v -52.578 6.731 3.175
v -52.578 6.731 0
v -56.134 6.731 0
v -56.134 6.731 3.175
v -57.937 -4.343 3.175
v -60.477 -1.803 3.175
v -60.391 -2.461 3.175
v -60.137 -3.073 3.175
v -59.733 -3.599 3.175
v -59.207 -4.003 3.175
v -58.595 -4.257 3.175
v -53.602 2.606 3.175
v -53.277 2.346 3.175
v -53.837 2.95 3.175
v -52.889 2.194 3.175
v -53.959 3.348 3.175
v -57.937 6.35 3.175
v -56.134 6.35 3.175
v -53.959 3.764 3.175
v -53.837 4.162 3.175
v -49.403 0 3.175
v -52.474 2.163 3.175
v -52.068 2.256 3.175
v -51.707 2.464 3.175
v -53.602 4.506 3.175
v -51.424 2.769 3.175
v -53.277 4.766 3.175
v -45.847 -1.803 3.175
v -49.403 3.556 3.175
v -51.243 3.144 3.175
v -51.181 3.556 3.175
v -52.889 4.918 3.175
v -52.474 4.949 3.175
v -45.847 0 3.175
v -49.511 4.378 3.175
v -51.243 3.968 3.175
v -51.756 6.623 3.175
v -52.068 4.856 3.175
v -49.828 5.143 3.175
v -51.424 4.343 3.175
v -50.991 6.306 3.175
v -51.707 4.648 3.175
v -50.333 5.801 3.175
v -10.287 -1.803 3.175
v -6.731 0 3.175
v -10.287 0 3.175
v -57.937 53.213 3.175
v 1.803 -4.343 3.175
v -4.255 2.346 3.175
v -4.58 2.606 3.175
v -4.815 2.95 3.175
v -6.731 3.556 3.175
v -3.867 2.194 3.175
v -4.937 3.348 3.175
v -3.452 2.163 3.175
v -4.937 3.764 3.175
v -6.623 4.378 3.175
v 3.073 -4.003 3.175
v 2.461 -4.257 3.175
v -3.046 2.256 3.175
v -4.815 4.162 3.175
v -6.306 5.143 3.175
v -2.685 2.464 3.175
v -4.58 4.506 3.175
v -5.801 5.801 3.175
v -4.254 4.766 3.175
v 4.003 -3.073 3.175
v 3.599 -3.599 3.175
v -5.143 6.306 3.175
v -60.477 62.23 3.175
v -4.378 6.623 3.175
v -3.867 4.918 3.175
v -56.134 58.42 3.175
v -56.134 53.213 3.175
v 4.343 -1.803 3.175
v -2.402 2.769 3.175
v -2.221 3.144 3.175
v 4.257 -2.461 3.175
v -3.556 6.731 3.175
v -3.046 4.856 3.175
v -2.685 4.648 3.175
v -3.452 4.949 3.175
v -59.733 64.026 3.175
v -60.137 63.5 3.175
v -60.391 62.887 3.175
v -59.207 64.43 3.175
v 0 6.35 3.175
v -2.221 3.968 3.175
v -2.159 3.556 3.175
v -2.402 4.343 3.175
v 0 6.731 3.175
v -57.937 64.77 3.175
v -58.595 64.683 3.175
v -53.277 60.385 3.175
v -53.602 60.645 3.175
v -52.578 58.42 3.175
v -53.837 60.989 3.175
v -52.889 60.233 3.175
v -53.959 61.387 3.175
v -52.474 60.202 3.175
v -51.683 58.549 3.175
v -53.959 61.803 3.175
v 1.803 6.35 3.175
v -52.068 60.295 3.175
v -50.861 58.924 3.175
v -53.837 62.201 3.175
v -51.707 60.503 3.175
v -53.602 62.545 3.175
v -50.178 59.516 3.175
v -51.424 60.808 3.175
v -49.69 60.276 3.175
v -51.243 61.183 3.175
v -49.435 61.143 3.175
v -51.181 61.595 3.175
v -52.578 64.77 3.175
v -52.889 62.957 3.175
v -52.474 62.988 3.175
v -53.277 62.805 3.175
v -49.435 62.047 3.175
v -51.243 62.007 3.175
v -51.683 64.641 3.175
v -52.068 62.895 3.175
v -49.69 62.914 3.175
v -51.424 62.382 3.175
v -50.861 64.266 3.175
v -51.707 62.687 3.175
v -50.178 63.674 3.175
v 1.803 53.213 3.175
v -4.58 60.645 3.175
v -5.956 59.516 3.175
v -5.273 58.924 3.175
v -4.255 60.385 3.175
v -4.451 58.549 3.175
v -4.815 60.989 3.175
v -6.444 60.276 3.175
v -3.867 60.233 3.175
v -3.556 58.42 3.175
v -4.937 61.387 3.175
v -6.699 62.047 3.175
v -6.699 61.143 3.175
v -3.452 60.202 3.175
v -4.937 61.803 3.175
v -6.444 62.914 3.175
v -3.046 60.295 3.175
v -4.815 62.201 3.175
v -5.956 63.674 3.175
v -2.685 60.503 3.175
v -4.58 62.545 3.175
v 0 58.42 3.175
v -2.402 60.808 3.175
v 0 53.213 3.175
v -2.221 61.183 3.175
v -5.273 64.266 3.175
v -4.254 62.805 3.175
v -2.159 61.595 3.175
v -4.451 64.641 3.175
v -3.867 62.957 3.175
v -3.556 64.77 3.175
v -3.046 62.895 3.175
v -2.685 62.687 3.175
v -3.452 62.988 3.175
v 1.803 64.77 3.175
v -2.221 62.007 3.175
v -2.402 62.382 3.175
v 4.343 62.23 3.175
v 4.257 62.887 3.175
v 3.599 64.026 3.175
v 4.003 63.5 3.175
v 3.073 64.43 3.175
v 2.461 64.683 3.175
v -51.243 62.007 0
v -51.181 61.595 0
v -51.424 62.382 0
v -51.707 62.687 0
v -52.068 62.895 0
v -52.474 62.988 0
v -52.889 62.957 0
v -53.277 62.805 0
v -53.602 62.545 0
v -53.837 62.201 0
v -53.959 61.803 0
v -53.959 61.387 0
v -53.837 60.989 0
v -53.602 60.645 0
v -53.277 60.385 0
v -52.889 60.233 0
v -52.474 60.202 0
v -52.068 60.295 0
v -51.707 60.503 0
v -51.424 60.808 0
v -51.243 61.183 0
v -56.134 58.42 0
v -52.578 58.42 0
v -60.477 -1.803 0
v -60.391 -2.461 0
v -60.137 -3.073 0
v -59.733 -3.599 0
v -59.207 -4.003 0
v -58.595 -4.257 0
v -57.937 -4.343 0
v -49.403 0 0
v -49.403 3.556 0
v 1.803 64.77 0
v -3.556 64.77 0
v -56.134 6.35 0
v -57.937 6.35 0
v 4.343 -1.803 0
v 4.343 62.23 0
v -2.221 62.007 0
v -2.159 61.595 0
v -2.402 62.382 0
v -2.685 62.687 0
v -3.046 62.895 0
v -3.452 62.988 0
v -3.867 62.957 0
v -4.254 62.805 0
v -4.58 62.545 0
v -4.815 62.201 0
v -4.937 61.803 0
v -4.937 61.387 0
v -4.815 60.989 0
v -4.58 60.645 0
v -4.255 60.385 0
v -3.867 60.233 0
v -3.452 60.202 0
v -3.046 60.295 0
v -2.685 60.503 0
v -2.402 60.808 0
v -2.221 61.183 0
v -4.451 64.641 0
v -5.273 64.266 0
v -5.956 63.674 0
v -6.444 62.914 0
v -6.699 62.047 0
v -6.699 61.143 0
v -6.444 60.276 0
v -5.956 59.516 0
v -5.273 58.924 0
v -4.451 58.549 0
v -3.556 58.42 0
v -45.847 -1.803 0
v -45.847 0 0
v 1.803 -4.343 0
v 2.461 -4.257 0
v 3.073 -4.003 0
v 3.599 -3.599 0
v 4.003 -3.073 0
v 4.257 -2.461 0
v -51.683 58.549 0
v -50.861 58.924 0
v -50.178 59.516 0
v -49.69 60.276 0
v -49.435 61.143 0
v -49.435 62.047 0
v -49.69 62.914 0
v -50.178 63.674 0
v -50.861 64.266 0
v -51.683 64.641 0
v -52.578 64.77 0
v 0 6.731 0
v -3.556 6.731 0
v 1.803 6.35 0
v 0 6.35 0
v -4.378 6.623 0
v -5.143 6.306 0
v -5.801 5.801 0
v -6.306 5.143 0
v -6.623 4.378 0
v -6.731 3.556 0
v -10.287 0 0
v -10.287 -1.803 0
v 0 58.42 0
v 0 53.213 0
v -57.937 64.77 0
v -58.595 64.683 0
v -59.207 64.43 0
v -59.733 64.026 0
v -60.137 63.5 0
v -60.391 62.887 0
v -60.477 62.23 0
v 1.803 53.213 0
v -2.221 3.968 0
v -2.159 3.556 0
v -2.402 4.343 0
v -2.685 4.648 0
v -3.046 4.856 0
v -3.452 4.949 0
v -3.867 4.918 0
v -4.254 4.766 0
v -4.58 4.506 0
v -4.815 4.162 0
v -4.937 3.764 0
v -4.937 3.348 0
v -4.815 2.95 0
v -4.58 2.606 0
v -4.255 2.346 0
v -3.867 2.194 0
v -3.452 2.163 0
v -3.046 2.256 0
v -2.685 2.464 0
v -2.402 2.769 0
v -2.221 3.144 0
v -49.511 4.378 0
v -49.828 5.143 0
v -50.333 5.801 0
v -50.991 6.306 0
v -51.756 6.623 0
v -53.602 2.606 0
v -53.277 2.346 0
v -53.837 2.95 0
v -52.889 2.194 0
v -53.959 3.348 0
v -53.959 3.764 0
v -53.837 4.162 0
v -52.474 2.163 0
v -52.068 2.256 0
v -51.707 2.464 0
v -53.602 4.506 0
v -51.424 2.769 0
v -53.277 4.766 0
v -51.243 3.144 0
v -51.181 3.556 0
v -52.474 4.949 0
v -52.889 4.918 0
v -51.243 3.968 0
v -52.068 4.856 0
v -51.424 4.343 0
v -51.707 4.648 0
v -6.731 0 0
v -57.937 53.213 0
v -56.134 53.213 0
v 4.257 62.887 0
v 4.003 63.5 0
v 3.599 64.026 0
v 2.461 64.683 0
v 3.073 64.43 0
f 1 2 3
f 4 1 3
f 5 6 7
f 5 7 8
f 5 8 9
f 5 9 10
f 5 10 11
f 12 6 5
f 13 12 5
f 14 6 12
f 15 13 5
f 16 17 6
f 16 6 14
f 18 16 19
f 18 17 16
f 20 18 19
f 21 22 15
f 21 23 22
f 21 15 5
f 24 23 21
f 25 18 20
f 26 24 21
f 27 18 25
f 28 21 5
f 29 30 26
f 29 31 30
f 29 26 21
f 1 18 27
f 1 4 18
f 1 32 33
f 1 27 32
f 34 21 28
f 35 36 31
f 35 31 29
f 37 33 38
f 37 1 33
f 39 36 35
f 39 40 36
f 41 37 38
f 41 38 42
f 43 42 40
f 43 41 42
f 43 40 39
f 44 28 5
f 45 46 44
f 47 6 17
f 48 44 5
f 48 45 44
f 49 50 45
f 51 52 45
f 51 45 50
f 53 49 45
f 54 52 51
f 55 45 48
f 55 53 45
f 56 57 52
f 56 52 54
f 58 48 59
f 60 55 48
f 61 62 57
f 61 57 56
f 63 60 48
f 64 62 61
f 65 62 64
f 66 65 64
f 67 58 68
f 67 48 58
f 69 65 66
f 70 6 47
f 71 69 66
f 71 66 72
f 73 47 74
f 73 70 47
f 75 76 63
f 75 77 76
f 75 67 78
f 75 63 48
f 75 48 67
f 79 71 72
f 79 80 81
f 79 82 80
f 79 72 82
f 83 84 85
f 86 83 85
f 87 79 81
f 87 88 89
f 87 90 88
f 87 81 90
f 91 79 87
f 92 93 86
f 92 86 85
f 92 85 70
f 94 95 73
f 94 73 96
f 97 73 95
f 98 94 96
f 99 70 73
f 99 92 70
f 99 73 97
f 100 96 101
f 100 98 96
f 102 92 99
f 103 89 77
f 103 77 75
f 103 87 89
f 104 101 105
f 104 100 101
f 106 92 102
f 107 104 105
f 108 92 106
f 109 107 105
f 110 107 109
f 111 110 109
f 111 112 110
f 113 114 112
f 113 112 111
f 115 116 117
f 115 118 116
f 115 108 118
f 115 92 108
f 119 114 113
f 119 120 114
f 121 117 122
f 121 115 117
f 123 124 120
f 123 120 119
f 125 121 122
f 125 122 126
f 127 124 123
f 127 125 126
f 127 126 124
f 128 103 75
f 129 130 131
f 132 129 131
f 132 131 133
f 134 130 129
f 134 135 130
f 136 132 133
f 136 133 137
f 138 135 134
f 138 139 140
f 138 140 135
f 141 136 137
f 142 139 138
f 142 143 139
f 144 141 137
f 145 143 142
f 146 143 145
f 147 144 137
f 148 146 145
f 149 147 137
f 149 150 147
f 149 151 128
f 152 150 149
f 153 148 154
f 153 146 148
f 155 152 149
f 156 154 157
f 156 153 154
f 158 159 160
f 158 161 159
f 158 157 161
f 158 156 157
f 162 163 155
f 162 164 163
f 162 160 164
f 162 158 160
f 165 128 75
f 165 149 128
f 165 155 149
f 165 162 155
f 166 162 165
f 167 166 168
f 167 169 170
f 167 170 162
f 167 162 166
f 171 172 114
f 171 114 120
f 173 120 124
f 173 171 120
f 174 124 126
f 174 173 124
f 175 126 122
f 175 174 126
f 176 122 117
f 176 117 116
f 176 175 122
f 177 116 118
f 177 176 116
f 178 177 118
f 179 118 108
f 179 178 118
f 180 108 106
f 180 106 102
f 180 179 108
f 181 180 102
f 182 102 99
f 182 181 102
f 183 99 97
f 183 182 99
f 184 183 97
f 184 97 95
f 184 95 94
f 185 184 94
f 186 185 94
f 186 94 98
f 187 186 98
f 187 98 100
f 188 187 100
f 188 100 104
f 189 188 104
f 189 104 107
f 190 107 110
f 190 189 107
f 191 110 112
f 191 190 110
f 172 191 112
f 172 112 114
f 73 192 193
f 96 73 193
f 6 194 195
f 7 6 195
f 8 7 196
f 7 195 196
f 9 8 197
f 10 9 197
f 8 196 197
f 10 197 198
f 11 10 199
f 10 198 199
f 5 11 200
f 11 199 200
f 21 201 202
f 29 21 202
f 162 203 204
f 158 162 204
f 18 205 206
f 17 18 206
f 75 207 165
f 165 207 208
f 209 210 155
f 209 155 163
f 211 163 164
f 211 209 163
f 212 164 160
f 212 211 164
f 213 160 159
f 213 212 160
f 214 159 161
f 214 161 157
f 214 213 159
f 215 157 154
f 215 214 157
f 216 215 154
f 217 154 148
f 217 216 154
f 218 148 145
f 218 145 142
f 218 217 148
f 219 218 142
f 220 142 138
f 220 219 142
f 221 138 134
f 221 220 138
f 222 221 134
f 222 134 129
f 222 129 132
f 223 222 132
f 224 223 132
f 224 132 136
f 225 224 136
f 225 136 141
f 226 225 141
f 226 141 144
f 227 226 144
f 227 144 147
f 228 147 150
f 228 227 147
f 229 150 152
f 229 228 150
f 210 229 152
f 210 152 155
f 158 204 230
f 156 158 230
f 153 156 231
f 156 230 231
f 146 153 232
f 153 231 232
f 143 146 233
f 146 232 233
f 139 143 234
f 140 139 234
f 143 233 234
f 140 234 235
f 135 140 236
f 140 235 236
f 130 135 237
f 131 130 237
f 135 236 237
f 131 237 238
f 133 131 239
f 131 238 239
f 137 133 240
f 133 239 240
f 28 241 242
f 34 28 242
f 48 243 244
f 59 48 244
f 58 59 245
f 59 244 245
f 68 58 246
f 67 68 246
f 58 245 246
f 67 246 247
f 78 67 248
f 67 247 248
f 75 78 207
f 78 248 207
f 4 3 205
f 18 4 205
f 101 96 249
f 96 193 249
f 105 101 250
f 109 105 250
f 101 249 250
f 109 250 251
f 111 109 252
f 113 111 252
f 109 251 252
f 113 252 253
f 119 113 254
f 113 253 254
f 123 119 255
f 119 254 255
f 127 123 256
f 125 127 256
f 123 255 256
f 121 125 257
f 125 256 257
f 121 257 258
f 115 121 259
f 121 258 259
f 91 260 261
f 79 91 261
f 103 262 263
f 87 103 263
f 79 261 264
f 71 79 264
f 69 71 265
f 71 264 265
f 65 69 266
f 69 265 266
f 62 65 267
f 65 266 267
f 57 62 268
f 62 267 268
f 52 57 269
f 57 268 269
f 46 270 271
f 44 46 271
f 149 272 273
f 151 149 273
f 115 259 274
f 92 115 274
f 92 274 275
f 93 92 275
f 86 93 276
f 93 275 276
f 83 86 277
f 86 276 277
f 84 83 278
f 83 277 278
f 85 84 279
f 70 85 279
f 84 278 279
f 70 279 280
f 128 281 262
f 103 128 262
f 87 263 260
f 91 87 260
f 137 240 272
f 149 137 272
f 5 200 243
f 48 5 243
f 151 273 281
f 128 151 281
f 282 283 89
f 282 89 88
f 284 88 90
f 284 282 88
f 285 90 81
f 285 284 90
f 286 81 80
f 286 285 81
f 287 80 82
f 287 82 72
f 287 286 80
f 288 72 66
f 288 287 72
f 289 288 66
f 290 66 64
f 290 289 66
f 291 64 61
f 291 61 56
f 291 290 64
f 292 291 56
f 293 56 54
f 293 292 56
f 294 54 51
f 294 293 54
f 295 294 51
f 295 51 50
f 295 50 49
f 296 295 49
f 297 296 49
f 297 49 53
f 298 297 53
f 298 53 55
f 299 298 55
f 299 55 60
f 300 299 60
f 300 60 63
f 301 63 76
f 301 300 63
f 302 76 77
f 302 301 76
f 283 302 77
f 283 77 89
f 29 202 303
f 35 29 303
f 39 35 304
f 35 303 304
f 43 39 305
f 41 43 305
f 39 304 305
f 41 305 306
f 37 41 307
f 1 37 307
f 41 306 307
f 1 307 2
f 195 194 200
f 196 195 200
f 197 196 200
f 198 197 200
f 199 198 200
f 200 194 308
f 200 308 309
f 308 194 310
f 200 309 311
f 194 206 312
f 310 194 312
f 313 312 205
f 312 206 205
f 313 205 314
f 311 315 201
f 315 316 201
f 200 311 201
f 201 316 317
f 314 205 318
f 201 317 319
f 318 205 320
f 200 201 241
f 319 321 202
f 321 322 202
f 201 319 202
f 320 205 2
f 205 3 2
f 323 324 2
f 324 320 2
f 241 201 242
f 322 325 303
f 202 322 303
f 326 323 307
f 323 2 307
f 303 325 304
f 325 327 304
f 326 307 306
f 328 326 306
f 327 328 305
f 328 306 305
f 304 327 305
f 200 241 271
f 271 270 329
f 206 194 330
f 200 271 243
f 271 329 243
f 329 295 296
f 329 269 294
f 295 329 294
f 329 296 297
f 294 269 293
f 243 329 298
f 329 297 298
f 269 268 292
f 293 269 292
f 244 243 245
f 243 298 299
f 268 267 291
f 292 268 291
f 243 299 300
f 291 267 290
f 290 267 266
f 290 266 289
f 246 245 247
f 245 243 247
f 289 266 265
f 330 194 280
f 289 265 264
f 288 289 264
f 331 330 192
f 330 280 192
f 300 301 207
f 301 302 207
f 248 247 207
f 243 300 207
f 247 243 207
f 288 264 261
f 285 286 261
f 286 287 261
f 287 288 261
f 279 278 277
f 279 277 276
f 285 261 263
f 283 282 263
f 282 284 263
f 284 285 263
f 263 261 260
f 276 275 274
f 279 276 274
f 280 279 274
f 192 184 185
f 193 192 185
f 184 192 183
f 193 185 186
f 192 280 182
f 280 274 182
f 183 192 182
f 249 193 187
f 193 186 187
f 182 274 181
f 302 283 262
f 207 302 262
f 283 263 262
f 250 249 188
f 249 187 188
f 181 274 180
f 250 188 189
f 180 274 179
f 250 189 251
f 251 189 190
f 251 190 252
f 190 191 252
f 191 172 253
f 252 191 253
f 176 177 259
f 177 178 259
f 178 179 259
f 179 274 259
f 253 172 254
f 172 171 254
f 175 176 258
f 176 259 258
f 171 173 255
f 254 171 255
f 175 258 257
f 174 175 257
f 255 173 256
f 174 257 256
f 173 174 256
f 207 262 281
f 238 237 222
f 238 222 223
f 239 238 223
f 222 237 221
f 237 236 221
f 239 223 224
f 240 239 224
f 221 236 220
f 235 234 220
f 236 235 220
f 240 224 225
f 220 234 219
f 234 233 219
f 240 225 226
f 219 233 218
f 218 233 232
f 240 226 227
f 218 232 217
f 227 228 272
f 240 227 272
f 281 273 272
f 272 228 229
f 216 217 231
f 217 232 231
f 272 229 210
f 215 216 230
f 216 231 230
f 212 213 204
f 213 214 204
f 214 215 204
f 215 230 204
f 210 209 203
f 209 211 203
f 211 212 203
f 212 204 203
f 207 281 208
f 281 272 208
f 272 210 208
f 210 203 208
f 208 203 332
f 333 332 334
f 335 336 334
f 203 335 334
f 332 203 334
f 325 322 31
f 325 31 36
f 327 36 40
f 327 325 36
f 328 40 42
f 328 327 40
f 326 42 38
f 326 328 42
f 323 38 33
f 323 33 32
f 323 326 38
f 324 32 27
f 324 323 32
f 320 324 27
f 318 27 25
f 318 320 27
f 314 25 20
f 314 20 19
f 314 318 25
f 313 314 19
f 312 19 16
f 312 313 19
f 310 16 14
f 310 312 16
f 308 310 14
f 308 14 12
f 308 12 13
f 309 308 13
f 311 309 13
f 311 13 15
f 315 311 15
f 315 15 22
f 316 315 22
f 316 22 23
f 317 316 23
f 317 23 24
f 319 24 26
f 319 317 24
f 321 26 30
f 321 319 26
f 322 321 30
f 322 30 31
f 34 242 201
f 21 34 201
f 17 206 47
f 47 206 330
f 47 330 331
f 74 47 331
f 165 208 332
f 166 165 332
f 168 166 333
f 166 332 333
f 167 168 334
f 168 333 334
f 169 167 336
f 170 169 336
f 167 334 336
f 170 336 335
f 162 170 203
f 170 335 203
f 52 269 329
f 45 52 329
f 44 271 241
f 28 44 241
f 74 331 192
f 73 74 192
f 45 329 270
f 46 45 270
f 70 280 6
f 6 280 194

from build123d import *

# Parameters (mm, degrees)
SKETCH1_R           = 3.175
SKETCH1_R_2         = 1.397
BOSS_EXTRUDE1_DEPTH = 3.175


with BuildPart() as part:
    # Sketch1 → Boss-Extrude1 (new body)
    # profile 1 of 5: a face of its own
    with BuildSketch(Plane.XY):
        with BuildLine():
            Line((0, 58.42), (0, 53.213))
            Line((0, 53.213), (1.8034, 53.213))
            Line((1.8034, 53.213), (1.8034, 6.35))
            Line((1.8034, 6.35), (0, 6.35))
            Line((0, 6.35), (0, 6.731))
            Line((0, 6.731), (-3.556, 6.731))
            ThreePointArc((-3.556, 6.731), (-1.31093597, 5.80106403), (-0.381, 3.556))
            ThreePointArc((-0.381, 3.556), (-3.556, 0.381), (-6.731, 3.556))
            Line((-6.731, 3.556), (-6.731, 0))
            Line((-6.731, 0), (-10.287, 0))
            Line((-10.287, 0), (-10.287, -1.8034))
            Line((-10.287, -1.8034), (-45.847, -1.8034))
            Line((-45.847, -1.8034), (-45.847, 0))
            Line((-45.847, 0), (-49.403, 0))
            Line((-49.403, 0), (-49.403, 3.556))
            ThreePointArc((-49.403, 3.556), (-54.82306403, 1.31093597), (-52.578, 6.731))
            Line((-52.578, 6.731), (-56.134, 6.731))
            Line((-56.134, 6.731), (-56.134, 6.35))
            Line((-56.134, 6.35), (-57.9374, 6.35))
            Line((-57.9374, 6.35), (-57.9374, 53.213))
            Line((-57.9374, 53.213), (-56.134, 53.213))
            Line((-56.134, 53.213), (-56.134, 58.42))
            Line((-56.134, 58.42), (-52.578, 58.42))
            ThreePointArc((-52.578, 58.42), (-55.753, 61.595), (-52.578, 64.77))
            Line((-52.578, 64.77), (-57.9374, 64.77))
            ThreePointArc((-57.9374, 64.77), (-59.733451224, 64.026051224), (-60.4774, 62.23))
            Line((-60.4774, 62.23), (-60.4774, -1.8034))
            ThreePointArc((-60.4774, -1.8034), (-59.733451224, -3.599451224), (-57.9374, -4.3434))
            Line((-57.9374, -4.3434), (1.8034, -4.3434))
            ThreePointArc((1.8034, -4.3434), (3.599451224, -3.599451224), (4.3434, -1.8034))
            Line((4.3434, -1.8034), (4.3434, 62.23))
            ThreePointArc((4.3434, 62.23), (3.599451224, 64.026051224), (1.8034, 64.77))
            Line((1.8034, 64.77), (-3.556000021, 64.77))
            ThreePointArc((-3.556000021, 64.77), (-1.310935977, 63.840064038), (-0.381, 61.595))
            ThreePointArc((-0.381, 61.595), (-1.31093597, 59.34993597), (-3.556, 58.42))
            Line((-3.556, 58.42), (0, 58.42))
        make_face()
    # profile 2 of 5: a face of its own
    with BuildSketch(Plane.XY):
        with Locations((-52.578, 61.595)):
            Circle(SKETCH1_R)
        with Locations((-52.578, 61.595)):
            Circle(SKETCH1_R_2, mode=Mode.SUBTRACT)
    # profile 3 of 5: a face of its own
    with BuildSketch(Plane.XY):
        with Locations((-3.556, 61.595)):
            Circle(SKETCH1_R)
        with Locations((-3.556, 61.595)):
            Circle(SKETCH1_R_2, mode=Mode.SUBTRACT)
    # profile 4 of 5: a face of its own
    with BuildSketch(Plane.XY):
        with Locations((-52.578, 3.556)):
            Circle(SKETCH1_R)
        with Locations((-52.578, 3.556)):
            Circle(SKETCH1_R_2, mode=Mode.SUBTRACT)
    # profile 5 of 5: a face of its own
    with BuildSketch(Plane.XY):
        with Locations((-3.556, 3.556)):
            Circle(SKETCH1_R)
        with Locations((-3.556, 3.556)):
            Circle(SKETCH1_R_2, mode=Mode.SUBTRACT)
    extrude(amount=BOSS_EXTRUDE1_DEPTH)


solid = part.part
